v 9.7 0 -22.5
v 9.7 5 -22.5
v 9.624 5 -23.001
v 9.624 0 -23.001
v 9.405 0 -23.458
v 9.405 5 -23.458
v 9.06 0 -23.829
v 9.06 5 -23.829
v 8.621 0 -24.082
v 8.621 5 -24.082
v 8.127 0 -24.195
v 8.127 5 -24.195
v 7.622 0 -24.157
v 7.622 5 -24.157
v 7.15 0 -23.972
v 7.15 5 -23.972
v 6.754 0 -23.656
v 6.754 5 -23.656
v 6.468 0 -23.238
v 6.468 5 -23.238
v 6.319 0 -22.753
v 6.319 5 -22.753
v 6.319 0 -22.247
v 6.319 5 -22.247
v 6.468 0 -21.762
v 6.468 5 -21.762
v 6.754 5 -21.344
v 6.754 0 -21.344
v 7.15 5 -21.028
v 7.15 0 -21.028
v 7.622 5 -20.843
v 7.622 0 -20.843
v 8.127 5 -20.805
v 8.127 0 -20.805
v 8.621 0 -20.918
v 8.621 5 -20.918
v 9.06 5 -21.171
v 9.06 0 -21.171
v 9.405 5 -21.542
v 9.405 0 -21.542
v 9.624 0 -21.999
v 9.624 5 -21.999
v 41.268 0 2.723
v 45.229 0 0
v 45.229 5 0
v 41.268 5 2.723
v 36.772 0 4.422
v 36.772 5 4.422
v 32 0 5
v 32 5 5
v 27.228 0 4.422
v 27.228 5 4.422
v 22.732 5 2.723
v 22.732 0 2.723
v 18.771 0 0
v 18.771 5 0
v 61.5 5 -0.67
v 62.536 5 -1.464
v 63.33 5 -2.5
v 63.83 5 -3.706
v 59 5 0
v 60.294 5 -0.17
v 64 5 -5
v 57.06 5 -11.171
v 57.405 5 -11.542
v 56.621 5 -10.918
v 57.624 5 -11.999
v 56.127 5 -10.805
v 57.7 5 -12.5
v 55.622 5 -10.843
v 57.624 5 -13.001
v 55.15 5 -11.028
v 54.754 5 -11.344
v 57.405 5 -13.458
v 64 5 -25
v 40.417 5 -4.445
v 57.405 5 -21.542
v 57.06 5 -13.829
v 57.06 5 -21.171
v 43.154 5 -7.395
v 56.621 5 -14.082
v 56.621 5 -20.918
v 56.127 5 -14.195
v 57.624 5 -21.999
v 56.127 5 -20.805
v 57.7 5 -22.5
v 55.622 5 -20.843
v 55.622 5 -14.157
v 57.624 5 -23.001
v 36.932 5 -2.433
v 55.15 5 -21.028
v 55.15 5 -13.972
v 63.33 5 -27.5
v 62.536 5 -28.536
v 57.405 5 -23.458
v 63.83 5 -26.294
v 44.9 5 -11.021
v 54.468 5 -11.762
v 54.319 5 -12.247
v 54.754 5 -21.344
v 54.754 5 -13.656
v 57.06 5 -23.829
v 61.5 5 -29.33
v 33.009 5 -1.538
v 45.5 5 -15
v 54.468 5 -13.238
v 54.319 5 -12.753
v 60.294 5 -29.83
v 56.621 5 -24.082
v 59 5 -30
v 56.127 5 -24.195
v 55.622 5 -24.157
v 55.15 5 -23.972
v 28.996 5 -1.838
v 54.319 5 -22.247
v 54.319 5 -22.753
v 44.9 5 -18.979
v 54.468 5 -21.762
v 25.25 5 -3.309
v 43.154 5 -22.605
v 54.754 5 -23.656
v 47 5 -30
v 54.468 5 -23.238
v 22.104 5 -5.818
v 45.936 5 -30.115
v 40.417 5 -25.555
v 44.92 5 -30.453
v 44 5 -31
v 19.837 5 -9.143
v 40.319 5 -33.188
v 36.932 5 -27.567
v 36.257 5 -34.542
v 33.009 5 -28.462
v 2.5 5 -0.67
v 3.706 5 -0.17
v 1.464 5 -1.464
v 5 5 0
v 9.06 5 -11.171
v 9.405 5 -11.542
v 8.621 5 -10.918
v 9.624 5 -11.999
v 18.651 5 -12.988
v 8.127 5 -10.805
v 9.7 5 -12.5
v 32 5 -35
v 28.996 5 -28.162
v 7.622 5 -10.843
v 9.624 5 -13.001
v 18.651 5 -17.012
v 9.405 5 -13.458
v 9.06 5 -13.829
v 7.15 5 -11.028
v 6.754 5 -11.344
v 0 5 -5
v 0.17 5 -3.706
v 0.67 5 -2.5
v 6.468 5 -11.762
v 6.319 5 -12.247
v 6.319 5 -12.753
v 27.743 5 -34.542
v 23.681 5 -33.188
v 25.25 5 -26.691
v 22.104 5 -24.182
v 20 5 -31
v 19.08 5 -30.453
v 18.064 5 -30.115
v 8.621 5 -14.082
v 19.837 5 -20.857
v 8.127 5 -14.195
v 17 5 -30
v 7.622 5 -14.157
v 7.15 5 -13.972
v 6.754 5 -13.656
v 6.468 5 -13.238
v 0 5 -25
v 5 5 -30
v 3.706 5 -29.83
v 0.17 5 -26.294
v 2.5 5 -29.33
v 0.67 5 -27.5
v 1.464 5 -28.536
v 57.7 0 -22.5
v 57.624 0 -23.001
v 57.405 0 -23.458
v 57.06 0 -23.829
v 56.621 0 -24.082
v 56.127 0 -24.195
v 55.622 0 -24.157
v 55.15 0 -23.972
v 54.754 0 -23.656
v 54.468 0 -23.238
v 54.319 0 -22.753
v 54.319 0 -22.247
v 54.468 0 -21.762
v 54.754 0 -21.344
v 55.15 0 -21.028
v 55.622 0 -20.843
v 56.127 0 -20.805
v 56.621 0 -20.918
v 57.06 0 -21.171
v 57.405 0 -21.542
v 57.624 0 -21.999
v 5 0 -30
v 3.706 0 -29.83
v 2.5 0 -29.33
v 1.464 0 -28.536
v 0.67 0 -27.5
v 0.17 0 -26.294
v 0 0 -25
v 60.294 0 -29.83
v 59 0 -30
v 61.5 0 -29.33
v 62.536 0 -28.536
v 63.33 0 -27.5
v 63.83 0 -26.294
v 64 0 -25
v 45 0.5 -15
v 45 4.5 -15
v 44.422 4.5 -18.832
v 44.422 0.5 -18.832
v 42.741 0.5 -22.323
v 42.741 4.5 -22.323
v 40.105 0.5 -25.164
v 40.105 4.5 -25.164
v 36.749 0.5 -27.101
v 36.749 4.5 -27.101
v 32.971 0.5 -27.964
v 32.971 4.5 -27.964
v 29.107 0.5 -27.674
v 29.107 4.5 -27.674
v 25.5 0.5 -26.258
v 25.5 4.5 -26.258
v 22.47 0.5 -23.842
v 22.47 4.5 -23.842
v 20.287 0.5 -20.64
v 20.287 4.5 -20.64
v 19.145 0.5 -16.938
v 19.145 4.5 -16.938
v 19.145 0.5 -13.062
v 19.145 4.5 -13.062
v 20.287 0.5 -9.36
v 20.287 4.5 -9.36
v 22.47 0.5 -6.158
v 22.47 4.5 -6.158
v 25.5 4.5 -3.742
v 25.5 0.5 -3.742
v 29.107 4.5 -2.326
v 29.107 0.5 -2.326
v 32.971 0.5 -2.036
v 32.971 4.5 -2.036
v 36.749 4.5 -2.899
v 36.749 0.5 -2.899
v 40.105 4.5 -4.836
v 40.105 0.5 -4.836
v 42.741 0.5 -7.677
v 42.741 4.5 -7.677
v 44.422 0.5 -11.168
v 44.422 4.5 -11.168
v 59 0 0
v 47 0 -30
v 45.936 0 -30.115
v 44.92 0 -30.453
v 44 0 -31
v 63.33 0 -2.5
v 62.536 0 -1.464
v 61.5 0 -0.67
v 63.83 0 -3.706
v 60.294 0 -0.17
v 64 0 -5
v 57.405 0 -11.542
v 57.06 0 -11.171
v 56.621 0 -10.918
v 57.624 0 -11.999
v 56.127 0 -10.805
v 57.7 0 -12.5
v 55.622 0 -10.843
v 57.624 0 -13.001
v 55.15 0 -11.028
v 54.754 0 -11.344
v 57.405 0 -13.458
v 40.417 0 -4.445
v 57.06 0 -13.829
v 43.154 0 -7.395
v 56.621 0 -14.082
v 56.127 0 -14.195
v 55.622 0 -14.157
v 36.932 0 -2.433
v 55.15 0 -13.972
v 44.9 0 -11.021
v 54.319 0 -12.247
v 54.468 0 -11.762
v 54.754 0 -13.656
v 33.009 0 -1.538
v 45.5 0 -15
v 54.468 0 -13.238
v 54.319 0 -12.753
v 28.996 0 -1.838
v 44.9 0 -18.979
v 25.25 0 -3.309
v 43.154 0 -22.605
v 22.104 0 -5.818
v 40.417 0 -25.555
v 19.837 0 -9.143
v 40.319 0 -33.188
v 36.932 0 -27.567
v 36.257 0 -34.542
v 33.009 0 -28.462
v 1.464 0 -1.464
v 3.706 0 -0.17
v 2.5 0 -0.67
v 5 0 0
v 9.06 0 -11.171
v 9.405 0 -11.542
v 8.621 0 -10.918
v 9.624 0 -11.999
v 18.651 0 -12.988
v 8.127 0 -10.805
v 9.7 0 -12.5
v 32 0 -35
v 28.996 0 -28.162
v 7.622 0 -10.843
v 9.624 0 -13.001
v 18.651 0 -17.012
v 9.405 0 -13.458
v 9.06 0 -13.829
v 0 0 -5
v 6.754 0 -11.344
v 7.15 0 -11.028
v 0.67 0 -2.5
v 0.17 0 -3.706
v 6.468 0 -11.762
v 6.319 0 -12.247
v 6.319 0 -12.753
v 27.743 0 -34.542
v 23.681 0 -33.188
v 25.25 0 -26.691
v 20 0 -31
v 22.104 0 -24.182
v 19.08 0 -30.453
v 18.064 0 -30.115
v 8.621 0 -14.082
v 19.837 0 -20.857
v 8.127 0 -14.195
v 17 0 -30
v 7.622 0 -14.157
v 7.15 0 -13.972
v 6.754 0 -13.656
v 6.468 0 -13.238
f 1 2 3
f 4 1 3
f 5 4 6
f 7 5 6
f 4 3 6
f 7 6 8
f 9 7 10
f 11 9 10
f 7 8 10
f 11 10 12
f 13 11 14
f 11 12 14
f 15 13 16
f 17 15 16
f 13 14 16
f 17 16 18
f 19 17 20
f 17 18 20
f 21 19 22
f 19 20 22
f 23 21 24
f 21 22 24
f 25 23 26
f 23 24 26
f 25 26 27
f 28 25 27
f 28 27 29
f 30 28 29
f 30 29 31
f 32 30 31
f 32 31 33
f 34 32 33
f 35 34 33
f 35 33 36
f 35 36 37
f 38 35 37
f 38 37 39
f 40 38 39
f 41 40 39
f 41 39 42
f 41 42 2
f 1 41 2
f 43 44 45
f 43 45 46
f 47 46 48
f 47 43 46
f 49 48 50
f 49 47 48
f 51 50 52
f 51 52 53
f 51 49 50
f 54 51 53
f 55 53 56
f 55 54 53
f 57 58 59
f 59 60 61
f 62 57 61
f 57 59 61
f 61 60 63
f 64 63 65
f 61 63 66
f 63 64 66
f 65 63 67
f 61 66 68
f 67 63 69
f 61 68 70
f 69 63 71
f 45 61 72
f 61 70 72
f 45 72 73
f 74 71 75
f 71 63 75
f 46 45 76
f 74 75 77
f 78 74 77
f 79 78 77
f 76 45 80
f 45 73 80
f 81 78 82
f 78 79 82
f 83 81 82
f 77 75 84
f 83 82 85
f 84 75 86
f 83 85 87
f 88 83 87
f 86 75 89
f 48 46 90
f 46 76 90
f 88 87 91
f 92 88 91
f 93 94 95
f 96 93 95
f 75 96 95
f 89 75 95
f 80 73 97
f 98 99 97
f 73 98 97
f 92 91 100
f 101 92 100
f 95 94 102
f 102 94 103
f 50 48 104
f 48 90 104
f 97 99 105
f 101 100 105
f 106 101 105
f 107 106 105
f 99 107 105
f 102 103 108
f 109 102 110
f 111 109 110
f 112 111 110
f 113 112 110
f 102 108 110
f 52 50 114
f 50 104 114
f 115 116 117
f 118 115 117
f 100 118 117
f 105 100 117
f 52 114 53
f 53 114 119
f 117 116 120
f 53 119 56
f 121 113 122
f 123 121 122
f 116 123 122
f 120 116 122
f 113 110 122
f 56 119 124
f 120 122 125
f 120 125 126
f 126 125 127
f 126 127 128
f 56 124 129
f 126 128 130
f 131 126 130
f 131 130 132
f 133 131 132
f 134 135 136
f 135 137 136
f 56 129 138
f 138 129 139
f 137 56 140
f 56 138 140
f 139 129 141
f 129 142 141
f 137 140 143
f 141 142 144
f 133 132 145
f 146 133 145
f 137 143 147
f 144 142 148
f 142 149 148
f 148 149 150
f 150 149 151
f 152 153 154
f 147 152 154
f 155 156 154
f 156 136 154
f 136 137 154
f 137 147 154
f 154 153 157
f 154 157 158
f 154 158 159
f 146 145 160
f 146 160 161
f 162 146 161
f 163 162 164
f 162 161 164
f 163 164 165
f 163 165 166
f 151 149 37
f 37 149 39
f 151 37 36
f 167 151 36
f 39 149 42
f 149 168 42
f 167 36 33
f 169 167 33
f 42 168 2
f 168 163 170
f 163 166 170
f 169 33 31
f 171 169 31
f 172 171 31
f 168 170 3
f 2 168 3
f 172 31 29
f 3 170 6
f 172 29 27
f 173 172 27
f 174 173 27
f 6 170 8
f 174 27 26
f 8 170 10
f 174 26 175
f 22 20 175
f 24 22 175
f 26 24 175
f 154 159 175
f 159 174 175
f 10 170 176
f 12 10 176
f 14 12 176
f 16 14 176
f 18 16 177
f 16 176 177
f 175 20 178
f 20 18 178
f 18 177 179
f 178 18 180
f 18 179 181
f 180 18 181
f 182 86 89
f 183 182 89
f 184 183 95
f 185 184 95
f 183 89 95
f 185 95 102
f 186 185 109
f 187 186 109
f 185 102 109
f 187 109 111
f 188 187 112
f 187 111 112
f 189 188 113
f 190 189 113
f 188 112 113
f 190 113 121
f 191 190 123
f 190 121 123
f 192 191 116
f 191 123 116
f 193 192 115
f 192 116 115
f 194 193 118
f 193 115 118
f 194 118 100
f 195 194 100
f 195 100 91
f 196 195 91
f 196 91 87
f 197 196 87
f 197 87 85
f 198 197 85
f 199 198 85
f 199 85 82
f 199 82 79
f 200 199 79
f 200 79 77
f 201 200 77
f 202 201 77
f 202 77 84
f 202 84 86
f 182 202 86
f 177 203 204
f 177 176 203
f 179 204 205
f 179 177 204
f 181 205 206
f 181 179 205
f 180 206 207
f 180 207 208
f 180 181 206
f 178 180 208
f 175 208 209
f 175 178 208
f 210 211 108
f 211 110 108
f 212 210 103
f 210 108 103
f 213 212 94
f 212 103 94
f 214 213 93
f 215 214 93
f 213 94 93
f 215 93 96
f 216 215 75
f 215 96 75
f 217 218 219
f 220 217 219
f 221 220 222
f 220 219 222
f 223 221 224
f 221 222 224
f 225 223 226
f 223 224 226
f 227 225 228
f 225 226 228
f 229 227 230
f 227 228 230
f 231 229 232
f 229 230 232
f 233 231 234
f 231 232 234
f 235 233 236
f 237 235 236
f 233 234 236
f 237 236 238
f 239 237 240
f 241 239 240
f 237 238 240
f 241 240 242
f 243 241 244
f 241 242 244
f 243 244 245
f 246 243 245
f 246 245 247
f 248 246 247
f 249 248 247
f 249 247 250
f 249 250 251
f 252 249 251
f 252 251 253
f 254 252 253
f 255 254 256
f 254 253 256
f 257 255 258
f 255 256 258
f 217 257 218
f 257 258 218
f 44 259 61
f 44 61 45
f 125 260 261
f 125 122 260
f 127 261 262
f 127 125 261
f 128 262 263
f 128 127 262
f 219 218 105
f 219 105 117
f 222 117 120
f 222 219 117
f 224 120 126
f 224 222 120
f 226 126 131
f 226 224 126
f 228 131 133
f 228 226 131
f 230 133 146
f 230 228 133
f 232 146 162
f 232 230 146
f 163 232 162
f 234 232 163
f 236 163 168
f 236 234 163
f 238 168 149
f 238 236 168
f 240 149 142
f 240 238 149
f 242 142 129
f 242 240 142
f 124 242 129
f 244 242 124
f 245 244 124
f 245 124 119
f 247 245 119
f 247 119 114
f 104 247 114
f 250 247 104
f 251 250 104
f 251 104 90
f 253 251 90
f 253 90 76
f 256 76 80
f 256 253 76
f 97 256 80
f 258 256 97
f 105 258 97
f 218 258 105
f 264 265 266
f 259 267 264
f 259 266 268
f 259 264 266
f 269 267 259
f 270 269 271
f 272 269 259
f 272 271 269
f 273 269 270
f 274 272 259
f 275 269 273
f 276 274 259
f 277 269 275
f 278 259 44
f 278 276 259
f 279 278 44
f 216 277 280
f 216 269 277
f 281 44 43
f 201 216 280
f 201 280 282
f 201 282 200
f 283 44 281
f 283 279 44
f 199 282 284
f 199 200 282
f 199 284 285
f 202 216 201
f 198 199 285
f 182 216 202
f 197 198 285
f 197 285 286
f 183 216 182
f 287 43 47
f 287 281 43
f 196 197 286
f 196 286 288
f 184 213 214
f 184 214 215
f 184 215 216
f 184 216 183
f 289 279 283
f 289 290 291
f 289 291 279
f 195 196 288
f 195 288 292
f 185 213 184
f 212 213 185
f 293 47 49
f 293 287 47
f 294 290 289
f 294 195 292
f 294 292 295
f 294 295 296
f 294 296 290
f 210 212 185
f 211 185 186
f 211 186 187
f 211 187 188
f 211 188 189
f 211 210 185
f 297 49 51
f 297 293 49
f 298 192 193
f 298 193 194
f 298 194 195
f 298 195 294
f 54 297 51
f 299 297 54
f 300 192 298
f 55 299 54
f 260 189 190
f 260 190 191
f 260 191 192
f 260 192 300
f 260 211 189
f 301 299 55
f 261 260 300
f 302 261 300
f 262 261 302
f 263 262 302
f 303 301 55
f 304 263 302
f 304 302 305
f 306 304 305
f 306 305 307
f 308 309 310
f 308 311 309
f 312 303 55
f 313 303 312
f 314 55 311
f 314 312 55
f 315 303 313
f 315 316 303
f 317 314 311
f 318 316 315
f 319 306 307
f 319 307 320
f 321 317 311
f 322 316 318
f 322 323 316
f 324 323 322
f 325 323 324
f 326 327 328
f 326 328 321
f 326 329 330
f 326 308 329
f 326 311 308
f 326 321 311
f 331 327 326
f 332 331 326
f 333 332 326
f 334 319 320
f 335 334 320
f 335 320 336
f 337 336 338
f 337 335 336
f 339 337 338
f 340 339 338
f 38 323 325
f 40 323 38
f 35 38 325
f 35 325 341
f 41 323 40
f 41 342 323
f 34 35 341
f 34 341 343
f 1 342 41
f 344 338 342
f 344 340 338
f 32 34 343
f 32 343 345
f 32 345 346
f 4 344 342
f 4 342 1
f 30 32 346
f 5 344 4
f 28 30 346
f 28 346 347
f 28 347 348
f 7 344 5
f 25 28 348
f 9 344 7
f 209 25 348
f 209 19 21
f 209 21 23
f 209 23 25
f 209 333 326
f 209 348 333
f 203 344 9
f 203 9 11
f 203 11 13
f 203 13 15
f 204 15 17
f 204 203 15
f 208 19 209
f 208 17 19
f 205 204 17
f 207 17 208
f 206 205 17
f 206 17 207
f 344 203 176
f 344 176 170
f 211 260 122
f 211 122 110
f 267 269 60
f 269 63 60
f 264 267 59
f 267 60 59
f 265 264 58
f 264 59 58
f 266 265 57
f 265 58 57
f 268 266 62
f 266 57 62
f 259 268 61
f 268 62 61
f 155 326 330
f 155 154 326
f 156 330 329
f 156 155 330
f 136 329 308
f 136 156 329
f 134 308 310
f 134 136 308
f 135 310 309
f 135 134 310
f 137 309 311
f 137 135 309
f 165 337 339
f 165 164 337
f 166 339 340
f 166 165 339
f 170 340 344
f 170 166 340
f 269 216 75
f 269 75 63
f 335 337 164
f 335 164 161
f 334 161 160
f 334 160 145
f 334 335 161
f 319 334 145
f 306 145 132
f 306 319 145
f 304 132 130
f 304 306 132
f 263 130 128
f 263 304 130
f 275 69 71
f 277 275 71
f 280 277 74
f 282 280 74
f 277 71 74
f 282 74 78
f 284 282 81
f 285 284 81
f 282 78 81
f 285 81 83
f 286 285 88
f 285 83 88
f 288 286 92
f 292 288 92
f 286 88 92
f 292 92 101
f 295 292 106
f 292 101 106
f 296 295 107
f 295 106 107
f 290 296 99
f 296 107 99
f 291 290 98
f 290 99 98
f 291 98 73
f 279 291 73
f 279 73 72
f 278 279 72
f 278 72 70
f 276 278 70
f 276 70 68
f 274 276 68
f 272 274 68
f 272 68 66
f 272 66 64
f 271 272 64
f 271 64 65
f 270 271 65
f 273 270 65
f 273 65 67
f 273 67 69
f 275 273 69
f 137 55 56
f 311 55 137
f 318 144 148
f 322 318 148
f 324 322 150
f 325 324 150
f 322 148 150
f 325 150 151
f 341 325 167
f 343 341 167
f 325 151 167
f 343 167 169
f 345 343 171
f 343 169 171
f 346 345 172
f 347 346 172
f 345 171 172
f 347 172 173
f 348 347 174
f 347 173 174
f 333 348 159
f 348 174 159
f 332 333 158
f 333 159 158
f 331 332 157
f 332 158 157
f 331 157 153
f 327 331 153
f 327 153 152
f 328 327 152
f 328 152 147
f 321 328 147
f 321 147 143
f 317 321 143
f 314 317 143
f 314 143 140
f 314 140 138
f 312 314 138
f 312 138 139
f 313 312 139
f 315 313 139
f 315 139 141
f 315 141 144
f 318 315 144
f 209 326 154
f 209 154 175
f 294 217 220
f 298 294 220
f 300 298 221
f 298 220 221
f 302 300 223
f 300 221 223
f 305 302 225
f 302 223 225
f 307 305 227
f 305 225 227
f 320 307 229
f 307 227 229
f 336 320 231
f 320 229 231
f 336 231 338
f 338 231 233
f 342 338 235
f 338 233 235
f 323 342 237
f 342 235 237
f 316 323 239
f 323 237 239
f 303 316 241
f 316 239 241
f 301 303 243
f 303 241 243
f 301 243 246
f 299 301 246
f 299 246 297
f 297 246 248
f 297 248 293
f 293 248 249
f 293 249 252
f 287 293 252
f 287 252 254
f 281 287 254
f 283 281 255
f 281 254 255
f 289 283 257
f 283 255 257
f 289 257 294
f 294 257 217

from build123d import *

# Parameters (mm, degrees)
EXTRUDE_1_DEPTH     = 5
SKETCH_2_R          = 13
CUT_EXTRUDE_1_DEPTH = 5
FILLET_1_R          = 5
HOLE_WIZARD_M3_1_D  = 3.4
CHAMFER1_SIZE       = 0.5


with BuildPart() as part:
    # 草图1 → 凸台-拉伸1 (new body)
    with BuildSketch(Plane(origin=(0, 0, 0), x_dir=(1, 0, 0), z_dir=(0, 1, 0))):
        with BuildLine():
            Line((45.228756555, 30), (64, 30))
            Line((64, 30), (64, 0))
            Line((64, 0), (45.228756555, 0))
            ThreePointArc((45.228756555, 0), (32, -5), (18.771243445, 0))
            Line((18.771243445, 0), (0, 0))
            Line((0, 0), (0, 30))
            Line((0, 30), (18.771243445, 30))
            ThreePointArc((18.771243445, 30), (32, 35), (45.228756555, 30))
        make_face()
    extrude(amount=EXTRUDE_1_DEPTH)

    # 草图2 → 切除-拉伸1 (cut)
    with BuildSketch(Plane(origin=(0, 5, 0), x_dir=(1, 0, 0), z_dir=(0, 1, 0))):
        with Locations((32, 15)):
            Circle(SKETCH_2_R)
    extrude(amount=-CUT_EXTRUDE_1_DEPTH, mode=Mode.SUBTRACT)

    # 圆角1
    fillet_1_edges = [part.edges().sort_by_distance(p)[0] for p in [
        (0, 2.5, -30),
        (18.771243445, 2.5, -30),
        (45.228756555, 2.5, -30),
        (64, 2.5, -30),
        (64, 2.5, 0),
        (0, 2.5, 0),
    ]]
    fillet(fillet_1_edges, radius=FILLET_1_R)

    # M3 间隙孔1 (through all)
    with Locations(Plane(origin=(0, 0, 0), x_dir=(-1, 0, 0), z_dir=(0, -1, 0))):
        with Locations((-56, 22.5), (-56, 12.5), (-8, 22.5), (-8, 12.5)):
            Hole(HOLE_WIZARD_M3_1_D / 2)

    # Chamfer1
    chamfer1_edges = [part.edges().sort_by_distance(p)[0] for p in [
        (19, 0, -15),
        (19, 5, -15),
    ]]
    chamfer(chamfer1_edges, length=CHAMFER1_SIZE)


solid = part.part
